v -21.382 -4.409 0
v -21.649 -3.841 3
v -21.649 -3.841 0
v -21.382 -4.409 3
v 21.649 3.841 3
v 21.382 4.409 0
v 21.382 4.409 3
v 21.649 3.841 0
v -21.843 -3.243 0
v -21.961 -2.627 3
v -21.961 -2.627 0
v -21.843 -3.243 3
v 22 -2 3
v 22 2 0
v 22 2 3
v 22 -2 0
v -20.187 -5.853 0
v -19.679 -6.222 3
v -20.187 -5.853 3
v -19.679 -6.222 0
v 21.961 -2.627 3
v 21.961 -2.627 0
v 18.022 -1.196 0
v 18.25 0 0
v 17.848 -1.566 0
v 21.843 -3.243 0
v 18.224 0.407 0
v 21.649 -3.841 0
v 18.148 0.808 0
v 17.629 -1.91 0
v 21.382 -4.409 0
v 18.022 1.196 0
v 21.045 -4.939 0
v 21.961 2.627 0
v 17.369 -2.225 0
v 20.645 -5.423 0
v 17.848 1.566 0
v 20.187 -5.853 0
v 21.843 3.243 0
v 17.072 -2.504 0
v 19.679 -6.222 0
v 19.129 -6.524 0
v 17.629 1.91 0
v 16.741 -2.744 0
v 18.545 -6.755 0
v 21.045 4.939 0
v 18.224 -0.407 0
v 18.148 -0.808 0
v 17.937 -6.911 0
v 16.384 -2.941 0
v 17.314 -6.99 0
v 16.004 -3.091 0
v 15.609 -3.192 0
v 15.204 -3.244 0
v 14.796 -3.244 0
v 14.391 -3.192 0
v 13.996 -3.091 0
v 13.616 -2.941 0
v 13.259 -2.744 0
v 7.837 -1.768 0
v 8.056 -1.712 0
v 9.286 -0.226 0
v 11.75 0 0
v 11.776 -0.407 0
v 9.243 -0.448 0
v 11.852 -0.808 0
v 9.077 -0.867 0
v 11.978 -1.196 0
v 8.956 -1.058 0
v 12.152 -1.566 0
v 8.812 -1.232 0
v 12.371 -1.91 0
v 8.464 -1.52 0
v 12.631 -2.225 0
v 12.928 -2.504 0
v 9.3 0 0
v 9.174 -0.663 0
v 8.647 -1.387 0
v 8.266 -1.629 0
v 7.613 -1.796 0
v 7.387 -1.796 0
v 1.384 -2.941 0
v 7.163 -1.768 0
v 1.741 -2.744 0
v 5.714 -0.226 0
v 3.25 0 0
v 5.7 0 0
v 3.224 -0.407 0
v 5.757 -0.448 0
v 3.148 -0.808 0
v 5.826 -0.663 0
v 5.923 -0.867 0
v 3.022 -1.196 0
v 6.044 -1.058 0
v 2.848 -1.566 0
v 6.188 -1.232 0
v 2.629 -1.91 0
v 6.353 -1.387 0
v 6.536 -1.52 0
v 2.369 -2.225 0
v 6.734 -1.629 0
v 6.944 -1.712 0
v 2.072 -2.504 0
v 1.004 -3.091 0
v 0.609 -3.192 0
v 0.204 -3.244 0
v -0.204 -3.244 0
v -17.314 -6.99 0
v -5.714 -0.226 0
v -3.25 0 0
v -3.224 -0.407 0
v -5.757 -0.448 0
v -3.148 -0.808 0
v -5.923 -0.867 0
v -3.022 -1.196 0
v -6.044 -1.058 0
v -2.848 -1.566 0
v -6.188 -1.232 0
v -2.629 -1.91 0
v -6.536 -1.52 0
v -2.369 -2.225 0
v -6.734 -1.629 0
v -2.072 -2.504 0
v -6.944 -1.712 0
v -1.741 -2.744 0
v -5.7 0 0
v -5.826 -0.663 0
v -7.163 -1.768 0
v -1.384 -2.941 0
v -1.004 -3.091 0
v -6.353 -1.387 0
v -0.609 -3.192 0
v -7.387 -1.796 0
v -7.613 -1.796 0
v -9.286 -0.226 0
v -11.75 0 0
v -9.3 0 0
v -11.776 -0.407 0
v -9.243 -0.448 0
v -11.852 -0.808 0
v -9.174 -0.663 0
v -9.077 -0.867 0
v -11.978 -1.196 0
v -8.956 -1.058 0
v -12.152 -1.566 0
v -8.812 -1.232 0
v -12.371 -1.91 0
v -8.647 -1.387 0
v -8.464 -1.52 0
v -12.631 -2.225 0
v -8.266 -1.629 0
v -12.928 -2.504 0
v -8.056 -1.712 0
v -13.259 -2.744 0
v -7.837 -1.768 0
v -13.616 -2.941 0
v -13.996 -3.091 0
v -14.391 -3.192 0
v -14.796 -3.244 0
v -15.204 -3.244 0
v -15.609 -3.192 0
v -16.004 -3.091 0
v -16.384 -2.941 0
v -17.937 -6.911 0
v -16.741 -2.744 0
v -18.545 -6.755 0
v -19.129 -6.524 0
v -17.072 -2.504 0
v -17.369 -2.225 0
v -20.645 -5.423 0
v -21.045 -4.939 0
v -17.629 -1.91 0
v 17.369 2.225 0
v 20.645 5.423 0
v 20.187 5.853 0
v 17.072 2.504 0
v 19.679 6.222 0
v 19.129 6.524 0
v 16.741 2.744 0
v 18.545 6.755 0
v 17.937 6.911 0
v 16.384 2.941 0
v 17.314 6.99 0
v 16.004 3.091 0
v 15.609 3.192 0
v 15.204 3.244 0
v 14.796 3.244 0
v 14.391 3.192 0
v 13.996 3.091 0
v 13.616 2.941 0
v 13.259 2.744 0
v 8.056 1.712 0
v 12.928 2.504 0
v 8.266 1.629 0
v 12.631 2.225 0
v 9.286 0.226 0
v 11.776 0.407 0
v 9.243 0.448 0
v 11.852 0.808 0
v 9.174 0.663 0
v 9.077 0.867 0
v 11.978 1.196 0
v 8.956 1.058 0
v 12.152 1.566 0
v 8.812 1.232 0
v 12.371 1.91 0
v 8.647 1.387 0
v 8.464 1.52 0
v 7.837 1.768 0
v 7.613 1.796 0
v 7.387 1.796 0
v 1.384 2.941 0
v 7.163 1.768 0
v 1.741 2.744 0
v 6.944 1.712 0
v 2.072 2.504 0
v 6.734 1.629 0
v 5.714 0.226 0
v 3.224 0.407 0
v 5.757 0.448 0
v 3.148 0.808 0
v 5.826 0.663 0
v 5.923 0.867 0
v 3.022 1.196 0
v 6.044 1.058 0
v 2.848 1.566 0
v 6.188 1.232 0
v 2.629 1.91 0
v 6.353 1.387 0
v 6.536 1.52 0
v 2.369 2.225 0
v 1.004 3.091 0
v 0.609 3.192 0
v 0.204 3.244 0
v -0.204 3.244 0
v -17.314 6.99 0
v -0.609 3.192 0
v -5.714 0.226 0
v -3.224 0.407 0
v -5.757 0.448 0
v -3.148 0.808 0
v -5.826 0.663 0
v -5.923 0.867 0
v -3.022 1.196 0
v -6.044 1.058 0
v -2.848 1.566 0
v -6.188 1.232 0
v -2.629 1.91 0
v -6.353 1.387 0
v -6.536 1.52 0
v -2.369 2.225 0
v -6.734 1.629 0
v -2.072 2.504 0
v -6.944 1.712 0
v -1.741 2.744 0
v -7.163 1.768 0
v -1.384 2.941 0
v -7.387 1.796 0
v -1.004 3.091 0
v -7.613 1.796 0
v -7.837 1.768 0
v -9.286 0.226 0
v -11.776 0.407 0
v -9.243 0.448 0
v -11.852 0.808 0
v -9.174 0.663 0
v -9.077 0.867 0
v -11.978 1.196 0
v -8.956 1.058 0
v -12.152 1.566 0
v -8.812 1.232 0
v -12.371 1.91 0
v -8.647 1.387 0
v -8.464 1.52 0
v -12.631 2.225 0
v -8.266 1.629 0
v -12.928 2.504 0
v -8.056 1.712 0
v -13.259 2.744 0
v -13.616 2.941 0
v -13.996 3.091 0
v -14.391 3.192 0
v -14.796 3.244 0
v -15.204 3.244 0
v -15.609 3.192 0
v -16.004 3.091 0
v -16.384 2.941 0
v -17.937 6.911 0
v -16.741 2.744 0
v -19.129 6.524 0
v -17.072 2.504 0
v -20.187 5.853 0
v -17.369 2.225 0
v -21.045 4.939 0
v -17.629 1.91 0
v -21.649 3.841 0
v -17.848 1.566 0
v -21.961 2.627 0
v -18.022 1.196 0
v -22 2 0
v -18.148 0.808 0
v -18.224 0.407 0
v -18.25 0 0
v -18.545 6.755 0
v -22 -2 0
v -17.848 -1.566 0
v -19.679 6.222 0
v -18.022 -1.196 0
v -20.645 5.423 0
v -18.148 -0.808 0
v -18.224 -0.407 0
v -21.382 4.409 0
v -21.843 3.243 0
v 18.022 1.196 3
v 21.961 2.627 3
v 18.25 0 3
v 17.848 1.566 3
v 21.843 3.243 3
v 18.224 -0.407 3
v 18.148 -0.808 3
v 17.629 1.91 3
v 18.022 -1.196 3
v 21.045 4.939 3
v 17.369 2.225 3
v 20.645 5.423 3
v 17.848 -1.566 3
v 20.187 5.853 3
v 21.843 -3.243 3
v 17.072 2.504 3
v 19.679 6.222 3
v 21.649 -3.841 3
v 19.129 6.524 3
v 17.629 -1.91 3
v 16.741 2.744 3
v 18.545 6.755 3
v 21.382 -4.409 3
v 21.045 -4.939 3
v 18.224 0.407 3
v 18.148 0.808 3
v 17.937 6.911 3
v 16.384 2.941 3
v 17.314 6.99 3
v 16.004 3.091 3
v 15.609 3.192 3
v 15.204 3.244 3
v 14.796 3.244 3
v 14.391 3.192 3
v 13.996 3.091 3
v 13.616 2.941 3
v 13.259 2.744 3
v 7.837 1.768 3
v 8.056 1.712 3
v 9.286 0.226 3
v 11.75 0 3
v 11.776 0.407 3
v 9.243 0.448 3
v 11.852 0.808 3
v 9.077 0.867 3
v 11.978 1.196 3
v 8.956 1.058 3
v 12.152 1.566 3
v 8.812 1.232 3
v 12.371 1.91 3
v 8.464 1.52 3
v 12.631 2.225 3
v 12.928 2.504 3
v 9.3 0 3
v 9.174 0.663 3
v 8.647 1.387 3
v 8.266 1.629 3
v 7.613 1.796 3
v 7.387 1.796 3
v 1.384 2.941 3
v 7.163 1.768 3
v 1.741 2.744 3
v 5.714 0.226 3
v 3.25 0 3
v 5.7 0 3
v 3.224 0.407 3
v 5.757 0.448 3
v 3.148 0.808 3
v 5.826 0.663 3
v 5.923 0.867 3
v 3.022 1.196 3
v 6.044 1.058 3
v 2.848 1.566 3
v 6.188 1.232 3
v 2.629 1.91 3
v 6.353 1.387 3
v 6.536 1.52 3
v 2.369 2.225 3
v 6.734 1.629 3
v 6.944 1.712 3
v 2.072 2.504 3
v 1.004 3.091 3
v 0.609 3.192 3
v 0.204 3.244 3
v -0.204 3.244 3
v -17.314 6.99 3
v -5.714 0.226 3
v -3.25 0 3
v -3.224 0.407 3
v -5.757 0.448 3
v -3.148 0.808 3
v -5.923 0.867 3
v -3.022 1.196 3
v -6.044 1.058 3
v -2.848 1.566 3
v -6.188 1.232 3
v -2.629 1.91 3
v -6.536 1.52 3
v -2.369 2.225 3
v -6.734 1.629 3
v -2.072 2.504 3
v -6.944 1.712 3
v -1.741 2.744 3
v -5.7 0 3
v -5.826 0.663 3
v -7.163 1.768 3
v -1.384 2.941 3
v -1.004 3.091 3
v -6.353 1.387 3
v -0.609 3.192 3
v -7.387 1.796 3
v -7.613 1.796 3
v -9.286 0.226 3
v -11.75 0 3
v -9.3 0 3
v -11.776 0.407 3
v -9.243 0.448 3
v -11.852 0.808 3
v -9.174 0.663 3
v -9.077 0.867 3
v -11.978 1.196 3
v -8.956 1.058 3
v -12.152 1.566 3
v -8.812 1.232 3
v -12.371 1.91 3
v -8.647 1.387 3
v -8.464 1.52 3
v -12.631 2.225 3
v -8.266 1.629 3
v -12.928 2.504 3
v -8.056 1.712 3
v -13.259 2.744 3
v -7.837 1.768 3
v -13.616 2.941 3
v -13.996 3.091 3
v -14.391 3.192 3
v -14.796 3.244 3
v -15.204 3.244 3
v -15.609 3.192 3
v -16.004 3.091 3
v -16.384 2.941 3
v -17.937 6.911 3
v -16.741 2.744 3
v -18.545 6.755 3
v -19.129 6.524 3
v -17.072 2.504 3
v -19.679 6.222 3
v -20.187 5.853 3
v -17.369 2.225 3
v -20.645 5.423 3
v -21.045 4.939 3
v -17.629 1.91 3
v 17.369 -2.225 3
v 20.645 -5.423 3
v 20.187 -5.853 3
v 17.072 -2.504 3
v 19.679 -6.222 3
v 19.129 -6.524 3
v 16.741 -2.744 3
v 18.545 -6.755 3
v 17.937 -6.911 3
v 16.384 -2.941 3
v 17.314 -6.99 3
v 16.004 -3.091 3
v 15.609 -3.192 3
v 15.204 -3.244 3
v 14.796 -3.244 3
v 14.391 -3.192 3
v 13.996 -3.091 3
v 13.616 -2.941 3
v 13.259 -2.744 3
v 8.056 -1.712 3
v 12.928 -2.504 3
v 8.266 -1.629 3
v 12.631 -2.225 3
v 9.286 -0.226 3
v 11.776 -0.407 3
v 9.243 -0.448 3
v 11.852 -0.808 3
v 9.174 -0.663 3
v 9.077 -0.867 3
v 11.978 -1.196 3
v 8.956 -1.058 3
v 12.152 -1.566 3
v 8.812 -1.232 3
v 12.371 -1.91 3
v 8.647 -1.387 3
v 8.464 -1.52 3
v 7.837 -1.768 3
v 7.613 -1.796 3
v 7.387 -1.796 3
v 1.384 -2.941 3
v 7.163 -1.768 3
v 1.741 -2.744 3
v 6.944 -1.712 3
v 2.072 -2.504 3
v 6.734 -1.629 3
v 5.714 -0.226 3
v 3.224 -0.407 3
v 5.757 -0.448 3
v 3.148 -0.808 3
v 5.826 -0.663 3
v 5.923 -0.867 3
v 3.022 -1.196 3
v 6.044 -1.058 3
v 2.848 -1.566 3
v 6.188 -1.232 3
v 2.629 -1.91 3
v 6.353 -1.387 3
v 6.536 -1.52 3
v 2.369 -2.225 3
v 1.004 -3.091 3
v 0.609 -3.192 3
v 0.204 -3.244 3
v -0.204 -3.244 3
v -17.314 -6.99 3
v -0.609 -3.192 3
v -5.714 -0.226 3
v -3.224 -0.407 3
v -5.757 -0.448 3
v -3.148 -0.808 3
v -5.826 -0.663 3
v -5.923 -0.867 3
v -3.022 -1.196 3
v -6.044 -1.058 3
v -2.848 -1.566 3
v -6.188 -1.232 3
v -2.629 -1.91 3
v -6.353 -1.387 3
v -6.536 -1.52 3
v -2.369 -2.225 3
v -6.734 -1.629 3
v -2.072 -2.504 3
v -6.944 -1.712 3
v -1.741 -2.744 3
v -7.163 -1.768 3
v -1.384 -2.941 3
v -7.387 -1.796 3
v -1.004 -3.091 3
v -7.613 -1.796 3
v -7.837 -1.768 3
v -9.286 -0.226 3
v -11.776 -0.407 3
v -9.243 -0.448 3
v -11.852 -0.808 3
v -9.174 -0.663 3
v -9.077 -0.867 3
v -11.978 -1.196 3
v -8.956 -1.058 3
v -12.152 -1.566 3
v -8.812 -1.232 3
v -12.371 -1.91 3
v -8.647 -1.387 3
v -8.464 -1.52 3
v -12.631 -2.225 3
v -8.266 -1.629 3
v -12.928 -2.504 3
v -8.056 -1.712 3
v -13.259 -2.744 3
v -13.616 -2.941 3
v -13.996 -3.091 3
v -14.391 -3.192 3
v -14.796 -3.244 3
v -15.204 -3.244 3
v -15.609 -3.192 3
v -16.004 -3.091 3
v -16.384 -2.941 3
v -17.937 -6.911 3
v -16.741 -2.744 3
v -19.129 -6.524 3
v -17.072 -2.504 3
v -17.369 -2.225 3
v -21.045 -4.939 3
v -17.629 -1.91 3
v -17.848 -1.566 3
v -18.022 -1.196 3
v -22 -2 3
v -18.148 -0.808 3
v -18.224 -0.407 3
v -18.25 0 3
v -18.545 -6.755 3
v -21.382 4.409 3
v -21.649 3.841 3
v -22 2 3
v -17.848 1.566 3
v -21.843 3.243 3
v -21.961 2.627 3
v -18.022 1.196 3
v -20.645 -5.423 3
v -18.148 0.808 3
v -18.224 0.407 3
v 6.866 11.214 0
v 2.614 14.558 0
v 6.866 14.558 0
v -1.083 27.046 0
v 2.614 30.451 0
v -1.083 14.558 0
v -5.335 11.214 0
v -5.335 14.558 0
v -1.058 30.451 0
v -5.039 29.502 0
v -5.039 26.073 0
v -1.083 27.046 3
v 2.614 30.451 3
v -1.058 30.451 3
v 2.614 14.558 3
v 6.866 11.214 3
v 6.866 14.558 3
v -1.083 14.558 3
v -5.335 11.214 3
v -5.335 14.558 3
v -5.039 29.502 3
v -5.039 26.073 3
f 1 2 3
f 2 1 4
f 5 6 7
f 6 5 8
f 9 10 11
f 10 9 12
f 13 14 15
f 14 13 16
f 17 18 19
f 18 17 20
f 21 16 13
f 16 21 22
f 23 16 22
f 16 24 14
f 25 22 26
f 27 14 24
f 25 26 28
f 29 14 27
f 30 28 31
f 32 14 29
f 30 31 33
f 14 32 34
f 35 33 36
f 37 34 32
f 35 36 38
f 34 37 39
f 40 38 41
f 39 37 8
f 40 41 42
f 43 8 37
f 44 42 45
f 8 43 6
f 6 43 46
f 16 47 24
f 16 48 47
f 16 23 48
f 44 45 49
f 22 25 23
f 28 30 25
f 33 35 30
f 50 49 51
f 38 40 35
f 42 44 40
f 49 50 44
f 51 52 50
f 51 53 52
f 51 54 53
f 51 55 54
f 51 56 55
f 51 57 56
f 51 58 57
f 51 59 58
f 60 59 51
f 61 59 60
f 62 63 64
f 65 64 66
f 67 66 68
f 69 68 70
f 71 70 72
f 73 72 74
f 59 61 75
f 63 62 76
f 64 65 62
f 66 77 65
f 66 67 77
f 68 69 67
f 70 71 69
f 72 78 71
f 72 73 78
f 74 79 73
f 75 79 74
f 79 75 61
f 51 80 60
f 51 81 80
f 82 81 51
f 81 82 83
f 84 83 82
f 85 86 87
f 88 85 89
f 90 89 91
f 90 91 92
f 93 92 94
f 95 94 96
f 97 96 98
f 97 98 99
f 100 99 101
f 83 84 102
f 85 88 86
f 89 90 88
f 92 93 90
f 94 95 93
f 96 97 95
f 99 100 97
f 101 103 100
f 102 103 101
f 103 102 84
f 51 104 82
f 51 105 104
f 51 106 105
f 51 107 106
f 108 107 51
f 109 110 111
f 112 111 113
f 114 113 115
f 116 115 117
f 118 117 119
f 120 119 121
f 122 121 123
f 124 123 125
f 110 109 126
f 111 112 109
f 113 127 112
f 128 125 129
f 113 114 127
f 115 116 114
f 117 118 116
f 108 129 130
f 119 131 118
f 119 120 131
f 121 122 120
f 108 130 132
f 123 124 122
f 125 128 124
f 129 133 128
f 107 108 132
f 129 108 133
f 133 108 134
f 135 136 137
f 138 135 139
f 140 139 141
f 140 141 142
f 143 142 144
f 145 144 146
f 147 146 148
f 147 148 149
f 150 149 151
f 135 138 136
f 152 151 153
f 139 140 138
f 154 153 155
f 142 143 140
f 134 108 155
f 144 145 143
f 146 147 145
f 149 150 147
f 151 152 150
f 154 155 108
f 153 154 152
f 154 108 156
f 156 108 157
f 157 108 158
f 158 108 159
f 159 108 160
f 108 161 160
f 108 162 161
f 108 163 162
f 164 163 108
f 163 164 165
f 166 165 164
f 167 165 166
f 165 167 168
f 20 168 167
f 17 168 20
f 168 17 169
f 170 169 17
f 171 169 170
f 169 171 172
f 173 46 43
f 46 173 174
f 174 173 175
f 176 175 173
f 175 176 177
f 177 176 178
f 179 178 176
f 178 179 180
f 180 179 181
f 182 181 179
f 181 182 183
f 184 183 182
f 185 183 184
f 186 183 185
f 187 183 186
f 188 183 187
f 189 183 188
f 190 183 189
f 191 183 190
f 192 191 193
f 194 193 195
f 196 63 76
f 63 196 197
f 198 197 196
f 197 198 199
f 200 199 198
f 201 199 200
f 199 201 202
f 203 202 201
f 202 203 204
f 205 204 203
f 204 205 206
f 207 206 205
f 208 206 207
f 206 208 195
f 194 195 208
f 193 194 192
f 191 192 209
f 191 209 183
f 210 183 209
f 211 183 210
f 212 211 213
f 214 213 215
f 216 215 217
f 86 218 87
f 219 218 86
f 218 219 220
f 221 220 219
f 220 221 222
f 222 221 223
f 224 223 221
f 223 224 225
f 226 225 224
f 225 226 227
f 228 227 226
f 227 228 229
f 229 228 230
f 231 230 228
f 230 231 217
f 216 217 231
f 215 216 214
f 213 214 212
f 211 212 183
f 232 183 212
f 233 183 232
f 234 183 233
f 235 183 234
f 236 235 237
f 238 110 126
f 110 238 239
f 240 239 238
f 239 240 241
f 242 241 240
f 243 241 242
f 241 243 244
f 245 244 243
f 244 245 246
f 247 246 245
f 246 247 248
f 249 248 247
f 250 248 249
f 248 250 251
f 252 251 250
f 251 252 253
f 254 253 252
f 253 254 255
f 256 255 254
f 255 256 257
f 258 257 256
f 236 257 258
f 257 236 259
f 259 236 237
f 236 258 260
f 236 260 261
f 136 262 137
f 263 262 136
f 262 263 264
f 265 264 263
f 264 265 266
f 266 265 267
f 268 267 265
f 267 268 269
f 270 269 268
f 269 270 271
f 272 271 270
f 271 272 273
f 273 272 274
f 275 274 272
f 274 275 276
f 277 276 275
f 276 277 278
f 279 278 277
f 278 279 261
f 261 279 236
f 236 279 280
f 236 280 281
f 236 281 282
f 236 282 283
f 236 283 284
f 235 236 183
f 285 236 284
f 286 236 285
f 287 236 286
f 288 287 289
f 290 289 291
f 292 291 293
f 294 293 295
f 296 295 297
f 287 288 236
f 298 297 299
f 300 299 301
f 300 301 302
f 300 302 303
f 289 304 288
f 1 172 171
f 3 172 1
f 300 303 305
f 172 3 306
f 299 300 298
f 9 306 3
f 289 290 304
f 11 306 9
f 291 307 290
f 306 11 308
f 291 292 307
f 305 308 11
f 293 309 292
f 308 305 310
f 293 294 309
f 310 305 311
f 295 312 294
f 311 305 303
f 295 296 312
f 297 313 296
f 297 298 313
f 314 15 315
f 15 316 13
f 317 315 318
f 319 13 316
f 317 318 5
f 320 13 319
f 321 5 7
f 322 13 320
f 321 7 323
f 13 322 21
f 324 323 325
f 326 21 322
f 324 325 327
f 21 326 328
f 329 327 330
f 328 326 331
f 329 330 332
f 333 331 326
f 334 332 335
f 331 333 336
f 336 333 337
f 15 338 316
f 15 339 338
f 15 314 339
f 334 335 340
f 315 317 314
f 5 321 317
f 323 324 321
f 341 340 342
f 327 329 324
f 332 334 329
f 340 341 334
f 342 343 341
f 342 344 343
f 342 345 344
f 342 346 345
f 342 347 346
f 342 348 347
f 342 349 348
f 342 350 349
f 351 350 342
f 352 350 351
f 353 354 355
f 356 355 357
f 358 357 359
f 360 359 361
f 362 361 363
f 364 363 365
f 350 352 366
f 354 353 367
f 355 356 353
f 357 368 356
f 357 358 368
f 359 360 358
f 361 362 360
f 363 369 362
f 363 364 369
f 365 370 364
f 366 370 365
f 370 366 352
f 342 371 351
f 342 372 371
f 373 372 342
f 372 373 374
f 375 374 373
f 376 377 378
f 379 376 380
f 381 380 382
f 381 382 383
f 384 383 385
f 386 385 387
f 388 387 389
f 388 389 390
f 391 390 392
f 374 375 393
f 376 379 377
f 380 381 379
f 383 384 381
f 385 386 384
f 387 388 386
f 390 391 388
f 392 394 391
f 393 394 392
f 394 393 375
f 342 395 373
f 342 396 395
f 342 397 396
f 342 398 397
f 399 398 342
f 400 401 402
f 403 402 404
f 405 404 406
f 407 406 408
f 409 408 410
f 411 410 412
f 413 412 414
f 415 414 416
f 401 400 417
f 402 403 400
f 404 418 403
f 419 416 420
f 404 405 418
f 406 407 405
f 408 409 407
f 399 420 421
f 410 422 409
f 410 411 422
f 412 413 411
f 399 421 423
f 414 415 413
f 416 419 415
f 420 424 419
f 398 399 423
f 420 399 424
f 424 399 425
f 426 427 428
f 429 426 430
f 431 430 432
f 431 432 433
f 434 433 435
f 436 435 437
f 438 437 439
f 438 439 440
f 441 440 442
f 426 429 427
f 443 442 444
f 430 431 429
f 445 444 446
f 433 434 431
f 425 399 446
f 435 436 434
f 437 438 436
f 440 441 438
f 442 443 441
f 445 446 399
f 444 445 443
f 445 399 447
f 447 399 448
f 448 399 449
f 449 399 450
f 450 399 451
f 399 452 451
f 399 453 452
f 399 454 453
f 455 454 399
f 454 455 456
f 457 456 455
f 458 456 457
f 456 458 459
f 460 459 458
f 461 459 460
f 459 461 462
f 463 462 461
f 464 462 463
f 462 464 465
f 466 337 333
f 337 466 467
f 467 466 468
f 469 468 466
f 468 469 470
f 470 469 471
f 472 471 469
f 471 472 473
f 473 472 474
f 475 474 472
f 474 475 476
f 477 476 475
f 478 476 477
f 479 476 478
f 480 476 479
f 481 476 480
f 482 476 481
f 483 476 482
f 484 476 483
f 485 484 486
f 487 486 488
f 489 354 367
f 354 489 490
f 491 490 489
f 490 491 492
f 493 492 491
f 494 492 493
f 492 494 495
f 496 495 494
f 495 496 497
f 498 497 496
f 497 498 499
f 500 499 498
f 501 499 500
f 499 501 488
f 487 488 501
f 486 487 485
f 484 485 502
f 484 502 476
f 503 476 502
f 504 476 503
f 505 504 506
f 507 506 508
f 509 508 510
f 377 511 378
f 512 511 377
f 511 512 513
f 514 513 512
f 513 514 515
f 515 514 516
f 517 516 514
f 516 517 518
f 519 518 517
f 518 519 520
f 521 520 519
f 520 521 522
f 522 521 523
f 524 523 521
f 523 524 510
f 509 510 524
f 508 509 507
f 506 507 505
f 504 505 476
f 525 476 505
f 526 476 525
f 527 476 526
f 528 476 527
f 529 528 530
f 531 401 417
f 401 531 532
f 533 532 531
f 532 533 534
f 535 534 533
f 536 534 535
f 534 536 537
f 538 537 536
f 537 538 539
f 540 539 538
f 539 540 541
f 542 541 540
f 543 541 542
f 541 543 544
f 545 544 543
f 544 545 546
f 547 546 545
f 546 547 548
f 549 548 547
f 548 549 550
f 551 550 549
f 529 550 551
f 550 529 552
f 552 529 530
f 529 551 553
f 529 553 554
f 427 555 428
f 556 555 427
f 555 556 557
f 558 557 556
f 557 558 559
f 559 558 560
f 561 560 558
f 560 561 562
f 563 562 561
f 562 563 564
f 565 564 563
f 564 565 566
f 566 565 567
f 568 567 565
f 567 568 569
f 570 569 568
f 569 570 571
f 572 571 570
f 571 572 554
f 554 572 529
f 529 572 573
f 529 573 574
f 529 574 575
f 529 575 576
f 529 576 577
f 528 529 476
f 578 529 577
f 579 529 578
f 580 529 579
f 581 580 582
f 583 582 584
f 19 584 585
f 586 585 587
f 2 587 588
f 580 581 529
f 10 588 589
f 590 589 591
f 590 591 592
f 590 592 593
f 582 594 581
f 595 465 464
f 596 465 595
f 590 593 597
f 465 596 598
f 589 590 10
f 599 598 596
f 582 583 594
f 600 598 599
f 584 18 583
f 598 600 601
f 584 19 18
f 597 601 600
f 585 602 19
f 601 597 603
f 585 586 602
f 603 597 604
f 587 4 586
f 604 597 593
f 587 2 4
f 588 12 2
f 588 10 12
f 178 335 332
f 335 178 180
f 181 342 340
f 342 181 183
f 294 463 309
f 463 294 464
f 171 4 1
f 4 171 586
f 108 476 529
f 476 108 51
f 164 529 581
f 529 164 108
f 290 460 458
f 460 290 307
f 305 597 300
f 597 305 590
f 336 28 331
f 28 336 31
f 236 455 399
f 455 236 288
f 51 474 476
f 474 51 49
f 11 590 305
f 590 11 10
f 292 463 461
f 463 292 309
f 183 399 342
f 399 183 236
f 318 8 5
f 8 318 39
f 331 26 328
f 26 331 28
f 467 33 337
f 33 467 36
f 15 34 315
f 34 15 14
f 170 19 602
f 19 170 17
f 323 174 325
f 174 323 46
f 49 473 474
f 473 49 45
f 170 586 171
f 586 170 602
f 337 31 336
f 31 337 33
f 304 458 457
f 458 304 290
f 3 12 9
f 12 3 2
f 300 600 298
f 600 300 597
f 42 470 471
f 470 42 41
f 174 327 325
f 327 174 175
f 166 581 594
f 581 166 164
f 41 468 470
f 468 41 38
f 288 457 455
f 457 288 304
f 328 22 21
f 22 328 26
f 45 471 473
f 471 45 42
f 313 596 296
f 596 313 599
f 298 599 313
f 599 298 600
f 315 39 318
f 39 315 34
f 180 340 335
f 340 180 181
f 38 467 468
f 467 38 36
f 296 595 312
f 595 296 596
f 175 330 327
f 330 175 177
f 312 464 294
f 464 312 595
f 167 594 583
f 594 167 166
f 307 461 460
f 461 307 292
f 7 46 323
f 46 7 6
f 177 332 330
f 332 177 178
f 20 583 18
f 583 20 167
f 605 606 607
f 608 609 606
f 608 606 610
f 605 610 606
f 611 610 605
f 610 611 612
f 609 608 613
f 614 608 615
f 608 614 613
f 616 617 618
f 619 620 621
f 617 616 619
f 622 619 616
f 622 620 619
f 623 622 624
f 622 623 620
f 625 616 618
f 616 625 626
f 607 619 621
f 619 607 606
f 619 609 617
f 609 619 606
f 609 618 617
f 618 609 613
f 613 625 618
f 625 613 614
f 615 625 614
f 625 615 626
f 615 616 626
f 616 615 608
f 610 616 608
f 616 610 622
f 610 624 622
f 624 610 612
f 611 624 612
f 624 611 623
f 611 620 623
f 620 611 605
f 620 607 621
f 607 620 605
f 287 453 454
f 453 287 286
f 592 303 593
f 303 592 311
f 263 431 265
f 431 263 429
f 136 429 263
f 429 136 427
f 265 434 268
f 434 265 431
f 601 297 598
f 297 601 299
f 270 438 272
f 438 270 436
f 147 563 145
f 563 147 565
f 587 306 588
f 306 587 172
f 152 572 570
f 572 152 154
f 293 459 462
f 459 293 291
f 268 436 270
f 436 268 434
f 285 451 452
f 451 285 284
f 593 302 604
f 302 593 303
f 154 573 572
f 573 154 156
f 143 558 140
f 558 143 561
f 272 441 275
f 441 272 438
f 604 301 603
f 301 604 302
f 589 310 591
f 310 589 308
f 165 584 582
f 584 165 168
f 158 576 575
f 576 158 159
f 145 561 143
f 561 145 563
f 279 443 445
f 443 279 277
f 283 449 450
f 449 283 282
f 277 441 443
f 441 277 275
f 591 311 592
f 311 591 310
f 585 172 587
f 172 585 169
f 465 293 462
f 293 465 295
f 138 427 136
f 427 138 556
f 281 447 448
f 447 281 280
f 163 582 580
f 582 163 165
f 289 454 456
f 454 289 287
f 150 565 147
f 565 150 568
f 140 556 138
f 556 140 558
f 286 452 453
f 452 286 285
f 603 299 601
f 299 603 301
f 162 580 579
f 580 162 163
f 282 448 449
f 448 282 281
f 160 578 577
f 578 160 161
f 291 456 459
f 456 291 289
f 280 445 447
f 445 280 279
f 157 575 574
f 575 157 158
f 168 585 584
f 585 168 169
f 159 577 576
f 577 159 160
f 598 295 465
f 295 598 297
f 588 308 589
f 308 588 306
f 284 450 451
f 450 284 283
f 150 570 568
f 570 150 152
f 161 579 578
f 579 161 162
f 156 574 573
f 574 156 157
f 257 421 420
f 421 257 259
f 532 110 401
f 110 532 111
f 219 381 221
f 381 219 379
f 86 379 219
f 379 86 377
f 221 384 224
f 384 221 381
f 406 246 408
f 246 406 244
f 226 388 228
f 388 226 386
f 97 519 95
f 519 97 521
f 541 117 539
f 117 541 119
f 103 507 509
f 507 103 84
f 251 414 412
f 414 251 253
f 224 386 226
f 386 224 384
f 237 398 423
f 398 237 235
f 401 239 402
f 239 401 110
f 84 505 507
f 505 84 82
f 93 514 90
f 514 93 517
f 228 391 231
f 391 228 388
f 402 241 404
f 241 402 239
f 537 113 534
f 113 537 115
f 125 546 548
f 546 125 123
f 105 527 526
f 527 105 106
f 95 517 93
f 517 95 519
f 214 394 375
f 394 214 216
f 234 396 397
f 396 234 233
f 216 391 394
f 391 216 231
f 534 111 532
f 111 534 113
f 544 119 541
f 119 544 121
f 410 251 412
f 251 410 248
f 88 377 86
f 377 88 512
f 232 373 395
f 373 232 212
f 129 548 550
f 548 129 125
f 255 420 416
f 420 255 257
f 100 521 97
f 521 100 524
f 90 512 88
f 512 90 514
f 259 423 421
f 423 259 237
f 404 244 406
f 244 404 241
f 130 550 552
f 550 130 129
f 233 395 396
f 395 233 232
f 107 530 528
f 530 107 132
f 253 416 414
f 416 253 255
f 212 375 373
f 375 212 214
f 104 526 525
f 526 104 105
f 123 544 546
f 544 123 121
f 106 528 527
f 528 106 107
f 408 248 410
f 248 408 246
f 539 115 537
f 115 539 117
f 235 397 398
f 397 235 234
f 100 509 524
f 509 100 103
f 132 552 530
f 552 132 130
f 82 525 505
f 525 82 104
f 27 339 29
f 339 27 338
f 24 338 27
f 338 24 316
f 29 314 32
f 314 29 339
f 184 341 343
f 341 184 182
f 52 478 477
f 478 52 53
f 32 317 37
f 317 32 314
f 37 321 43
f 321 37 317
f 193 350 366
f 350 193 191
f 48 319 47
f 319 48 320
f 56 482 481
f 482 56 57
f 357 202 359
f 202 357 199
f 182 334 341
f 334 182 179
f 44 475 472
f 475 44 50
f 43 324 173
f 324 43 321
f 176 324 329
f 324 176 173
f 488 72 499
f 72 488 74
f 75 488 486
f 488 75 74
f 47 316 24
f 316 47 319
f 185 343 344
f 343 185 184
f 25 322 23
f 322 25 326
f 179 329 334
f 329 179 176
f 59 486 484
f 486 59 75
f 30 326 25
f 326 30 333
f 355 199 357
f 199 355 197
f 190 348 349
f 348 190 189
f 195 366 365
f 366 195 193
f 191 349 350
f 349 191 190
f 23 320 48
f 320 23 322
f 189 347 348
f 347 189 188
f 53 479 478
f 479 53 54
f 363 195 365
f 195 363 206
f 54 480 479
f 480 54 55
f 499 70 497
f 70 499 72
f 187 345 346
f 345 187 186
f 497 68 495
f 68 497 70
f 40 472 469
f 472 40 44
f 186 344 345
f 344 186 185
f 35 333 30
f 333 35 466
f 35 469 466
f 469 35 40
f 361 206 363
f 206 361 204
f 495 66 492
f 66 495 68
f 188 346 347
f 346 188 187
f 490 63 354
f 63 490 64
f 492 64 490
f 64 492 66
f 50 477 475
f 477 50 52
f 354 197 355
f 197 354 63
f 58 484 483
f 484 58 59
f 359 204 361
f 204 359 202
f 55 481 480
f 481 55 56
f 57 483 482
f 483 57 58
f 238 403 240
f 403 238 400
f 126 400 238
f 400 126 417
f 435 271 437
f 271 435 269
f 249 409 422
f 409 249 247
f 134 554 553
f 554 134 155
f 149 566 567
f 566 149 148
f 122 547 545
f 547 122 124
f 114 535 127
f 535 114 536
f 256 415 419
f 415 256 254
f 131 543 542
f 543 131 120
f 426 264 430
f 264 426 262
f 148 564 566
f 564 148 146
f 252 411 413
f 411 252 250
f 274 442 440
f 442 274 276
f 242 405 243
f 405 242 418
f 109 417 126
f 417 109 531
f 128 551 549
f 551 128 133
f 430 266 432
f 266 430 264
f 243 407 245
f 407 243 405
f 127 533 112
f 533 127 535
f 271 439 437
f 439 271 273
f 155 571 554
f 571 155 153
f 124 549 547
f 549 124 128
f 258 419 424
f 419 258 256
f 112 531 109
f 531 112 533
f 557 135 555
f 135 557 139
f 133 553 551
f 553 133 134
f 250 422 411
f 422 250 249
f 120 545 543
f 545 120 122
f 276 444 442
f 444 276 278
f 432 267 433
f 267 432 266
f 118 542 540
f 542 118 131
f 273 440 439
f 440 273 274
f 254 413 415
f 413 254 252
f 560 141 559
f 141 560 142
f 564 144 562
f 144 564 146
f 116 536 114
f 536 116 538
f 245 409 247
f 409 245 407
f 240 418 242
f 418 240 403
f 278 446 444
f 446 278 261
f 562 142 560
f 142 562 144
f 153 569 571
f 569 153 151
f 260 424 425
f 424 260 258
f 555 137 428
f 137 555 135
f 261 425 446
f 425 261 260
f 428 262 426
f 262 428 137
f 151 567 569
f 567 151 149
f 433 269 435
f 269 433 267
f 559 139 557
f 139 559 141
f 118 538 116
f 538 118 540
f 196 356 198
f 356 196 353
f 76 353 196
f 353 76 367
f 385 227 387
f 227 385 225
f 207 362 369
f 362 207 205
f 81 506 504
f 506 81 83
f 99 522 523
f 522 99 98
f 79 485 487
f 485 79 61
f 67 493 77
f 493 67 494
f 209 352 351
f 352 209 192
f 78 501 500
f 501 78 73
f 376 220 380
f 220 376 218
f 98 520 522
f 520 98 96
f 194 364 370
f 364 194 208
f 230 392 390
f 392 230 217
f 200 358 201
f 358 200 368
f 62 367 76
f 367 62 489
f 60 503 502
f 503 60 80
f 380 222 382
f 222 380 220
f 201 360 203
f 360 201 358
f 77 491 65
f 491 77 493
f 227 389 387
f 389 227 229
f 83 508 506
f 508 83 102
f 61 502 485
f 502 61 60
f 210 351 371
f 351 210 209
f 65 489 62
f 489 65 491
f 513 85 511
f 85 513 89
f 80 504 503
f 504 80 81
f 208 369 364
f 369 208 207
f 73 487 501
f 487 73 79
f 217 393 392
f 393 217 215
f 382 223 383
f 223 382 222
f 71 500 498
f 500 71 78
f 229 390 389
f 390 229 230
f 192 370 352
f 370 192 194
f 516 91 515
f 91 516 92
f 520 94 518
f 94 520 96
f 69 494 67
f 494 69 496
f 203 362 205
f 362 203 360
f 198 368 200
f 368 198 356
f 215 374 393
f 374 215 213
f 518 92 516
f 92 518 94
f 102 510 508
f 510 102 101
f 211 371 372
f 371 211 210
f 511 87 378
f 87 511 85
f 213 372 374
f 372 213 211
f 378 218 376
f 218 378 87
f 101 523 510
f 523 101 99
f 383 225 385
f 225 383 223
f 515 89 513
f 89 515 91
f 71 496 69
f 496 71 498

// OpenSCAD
$fn = 50;


difference() {
	union() {
		hull() {
			translate(v = [-17.0000000000, 2.0000000000, 0]) {
				cylinder(h = 3, r = 5);
			}
			translate(v = [17.0000000000, 2.0000000000, 0]) {
				cylinder(h = 3, r = 5);
			}
			translate(v = [-17.0000000000, -2.0000000000, 0]) {
				cylinder(h = 3, r = 5);
			}
			translate(v = [17.0000000000, -2.0000000000, 0]) {
				cylinder(h = 3, r = 5);
			}
		}
		translate(v = [0, 30.0000000000, 0]) {
			linear_extrude(height = 3) {
				text(font = "DejaVu Sans Mono:style=Bold", halign = "center", size = 19.0000000000, text = "1", valign = "top");
			}
		}
	}
	union() {
		translate(v = [-15.0000000000, 0.0000000000, 0]) {
			translate(v = [0, 0, -100]) {
				cylinder(h = 200, r = 3.2500000000);
			}
		}
		translate(v = [0, 0, -100]) {
			cylinder(h = 200, r = 3.2500000000);
		}
		translate(v = [15.0000000000, 0.0000000000, 0]) {
			translate(v = [0, 0, -100]) {
				cylinder(h = 200, r = 3.2500000000);
			}
		}
		translate(v = [-15.0000000000, 0.0000000000, 0]) {
			translate(v = [0, 0, -100]) {
				cylinder(h = 200, r = 1.8000000000);
			}
		}
		translate(v = [-7.5000000000, 0.0000000000, 0]) {
			translate(v = [0, 0, -100]) {
				cylinder(h = 200, r = 1.8000000000);
			}
		}
		translate(v = [0, 0, -100]) {
			cylinder(h = 200, r = 1.8000000000);
		}
		translate(v = [7.5000000000, 0.0000000000, 0]) {
			translate(v = [0, 0, -100]) {
				cylinder(h = 200, r = 1.8000000000);
			}
		}
		translate(v = [15.0000000000, 0.0000000000, 0]) {
			translate(v = [0, 0, -100]) {
				cylinder(h = 200, r = 1.8000000000);
			}
		}
	}
}
